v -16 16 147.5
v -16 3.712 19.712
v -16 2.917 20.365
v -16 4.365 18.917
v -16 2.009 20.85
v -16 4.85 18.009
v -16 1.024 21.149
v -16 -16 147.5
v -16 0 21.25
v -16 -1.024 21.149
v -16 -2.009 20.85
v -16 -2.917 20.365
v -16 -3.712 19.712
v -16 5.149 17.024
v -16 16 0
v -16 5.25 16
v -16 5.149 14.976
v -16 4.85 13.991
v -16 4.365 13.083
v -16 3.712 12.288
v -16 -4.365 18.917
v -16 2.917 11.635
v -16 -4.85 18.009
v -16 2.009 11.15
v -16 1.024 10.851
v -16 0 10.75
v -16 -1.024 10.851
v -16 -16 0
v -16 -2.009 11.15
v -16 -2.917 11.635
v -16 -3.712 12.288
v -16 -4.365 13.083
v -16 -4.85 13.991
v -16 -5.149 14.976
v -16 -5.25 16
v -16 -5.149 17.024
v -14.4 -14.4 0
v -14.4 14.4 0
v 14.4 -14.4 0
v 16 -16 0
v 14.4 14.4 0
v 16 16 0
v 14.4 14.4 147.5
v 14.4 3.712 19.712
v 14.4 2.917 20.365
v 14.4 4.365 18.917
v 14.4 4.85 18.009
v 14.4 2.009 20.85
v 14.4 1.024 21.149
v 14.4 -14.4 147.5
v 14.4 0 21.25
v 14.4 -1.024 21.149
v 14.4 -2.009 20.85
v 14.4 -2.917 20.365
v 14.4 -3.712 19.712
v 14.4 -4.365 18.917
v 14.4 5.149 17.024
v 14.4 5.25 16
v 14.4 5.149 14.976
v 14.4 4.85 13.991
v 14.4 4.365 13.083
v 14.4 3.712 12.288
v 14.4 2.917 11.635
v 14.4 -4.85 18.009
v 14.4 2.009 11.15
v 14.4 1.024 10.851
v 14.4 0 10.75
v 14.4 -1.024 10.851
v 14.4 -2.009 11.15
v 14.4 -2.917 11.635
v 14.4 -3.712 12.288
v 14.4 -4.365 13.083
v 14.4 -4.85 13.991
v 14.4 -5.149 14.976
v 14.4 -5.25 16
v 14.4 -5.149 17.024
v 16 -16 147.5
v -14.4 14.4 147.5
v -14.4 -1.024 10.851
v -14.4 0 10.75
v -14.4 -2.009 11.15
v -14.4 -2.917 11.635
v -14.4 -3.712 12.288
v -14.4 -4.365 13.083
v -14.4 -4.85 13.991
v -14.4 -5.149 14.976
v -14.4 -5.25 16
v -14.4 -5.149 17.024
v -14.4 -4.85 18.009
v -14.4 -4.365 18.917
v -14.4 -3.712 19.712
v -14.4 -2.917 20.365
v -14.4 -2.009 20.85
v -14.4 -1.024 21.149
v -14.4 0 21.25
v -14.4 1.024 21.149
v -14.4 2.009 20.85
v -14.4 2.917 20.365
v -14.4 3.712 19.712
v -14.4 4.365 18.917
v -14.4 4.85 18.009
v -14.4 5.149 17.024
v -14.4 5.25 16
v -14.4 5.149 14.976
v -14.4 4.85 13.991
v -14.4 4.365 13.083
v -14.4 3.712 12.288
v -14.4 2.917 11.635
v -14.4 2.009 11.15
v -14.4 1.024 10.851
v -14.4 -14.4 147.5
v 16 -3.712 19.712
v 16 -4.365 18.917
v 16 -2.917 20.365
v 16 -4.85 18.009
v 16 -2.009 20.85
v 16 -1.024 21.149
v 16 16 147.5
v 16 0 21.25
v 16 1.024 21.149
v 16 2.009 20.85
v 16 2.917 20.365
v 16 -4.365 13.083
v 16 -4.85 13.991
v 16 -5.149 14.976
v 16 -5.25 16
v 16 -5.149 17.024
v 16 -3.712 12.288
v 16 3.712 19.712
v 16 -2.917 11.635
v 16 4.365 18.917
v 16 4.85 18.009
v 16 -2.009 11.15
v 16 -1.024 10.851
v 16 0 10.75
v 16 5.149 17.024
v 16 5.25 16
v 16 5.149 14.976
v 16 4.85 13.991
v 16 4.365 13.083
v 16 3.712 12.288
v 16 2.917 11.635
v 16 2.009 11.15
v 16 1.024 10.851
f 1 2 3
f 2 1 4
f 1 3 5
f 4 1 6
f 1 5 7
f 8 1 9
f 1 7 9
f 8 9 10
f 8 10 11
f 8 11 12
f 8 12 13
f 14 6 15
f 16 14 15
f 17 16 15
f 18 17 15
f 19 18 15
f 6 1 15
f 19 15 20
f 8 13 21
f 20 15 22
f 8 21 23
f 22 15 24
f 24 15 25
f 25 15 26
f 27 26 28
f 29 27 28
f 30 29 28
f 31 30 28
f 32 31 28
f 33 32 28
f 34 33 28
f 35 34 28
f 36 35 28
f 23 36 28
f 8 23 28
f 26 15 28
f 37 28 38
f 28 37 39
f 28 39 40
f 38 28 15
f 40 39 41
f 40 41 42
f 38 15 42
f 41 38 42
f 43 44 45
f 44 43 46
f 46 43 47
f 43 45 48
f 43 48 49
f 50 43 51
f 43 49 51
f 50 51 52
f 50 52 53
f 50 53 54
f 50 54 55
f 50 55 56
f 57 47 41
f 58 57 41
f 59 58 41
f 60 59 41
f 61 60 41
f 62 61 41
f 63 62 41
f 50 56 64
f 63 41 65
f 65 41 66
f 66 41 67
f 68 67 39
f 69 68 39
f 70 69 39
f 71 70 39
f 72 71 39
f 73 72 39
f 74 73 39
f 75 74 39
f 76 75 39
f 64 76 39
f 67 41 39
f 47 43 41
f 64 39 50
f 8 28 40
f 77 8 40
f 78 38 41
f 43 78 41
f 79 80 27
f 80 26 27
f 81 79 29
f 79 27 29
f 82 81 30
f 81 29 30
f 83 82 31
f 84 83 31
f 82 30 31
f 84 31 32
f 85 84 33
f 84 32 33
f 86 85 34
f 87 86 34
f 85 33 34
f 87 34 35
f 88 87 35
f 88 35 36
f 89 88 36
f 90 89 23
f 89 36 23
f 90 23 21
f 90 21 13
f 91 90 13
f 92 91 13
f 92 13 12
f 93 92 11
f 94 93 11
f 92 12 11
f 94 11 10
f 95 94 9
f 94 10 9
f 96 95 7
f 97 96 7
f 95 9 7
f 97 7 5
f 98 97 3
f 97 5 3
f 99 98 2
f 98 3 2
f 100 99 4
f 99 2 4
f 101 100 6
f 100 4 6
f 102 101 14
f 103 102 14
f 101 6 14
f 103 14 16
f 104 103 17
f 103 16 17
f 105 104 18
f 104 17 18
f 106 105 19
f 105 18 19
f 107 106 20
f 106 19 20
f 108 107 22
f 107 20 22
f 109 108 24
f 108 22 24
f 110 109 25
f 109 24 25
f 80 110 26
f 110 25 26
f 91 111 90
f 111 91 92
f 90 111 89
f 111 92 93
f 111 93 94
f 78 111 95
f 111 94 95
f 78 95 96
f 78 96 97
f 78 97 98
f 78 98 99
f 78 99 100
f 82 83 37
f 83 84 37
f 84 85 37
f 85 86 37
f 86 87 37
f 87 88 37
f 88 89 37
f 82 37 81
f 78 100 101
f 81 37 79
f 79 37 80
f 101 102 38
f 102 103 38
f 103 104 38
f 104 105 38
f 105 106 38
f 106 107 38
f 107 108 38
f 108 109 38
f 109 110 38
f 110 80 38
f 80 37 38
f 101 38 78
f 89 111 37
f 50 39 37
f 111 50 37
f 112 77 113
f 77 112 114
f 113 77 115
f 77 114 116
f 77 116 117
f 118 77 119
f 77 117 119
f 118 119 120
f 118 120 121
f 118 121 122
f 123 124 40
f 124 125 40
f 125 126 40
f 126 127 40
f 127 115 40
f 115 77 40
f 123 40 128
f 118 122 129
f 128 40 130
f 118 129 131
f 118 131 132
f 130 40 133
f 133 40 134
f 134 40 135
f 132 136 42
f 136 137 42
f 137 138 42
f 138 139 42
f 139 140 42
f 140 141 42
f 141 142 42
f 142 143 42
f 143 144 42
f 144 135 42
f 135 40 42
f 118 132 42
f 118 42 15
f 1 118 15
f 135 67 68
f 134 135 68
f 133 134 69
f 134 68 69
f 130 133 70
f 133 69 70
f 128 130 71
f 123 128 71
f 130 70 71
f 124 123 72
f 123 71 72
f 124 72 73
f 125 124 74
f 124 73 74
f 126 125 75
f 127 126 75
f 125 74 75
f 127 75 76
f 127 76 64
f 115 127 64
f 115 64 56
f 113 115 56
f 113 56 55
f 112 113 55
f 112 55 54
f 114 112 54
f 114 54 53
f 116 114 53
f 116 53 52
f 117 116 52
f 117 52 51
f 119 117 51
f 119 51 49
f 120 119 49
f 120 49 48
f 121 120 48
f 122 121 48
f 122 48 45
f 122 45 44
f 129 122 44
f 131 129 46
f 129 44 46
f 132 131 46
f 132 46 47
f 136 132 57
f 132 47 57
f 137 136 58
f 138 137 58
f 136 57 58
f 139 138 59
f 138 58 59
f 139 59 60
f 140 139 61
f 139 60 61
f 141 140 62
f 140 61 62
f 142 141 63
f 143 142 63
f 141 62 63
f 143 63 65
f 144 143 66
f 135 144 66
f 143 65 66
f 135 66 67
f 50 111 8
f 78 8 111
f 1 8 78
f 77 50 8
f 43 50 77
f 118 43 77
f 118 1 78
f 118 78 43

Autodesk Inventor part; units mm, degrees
ref_plane "YZ Plane" through (0, 0, 0) normal (1, 0, 0) x (0, 1, 0)
ref_plane "XZ Plane" through (0, 0, 0) normal (0, 1, 0) x (-1, 0, 0)
ref_plane "XY Plane" through (0, 0, 0) normal (0, 0, 1) x (1, 0, 0)
sketch "スケッチ1" plane through (0, 0, 0) normal (0, 0, 1) x (1, 0, 0)
  line L0 (-16, -16) -> (16, -16)
  line L1 (16, -16) -> (16, 16)
  line L2 (16, 16) -> (-16, 16)
  line L3 (-16, 16) -> (-16, -16)
  line L4 (-16, -16) -> (16, 16) construction
  line L5 (16, -16) -> (-16, 16) construction
  line L6 (-14.4, 14.4) -> (14.4, 14.4)
  line L7 (14.4, 14.4) -> (14.4, -14.4)
  line L8 (14.4, -14.4) -> (-14.4, -14.4)
  line L9 (-14.4, -14.4) -> (-14.4, 14.4)
  point P0 (0, 0)
  dimension "d0" = 32
  dimension "d1" = 32
  dimension "d2" = 1.6
extrude "押し出し1" add sketch "スケッチ1" along normal blind 147.5
sketch "スケッチ2" plane through (16, -16, 147.5) normal (1, 0, 0) x (0, 0, -1)
  line L0 (0, 0) -> (0, 32) projected
  point P0 (147.5, 16)
  point P1 (131.5, 16)
  dimension "d8" = 131.5
hole "穴1" at (16, 0, 16) direction (-1, 0, 0) diameter 10.5 end through all
properties part number "PipeB"
